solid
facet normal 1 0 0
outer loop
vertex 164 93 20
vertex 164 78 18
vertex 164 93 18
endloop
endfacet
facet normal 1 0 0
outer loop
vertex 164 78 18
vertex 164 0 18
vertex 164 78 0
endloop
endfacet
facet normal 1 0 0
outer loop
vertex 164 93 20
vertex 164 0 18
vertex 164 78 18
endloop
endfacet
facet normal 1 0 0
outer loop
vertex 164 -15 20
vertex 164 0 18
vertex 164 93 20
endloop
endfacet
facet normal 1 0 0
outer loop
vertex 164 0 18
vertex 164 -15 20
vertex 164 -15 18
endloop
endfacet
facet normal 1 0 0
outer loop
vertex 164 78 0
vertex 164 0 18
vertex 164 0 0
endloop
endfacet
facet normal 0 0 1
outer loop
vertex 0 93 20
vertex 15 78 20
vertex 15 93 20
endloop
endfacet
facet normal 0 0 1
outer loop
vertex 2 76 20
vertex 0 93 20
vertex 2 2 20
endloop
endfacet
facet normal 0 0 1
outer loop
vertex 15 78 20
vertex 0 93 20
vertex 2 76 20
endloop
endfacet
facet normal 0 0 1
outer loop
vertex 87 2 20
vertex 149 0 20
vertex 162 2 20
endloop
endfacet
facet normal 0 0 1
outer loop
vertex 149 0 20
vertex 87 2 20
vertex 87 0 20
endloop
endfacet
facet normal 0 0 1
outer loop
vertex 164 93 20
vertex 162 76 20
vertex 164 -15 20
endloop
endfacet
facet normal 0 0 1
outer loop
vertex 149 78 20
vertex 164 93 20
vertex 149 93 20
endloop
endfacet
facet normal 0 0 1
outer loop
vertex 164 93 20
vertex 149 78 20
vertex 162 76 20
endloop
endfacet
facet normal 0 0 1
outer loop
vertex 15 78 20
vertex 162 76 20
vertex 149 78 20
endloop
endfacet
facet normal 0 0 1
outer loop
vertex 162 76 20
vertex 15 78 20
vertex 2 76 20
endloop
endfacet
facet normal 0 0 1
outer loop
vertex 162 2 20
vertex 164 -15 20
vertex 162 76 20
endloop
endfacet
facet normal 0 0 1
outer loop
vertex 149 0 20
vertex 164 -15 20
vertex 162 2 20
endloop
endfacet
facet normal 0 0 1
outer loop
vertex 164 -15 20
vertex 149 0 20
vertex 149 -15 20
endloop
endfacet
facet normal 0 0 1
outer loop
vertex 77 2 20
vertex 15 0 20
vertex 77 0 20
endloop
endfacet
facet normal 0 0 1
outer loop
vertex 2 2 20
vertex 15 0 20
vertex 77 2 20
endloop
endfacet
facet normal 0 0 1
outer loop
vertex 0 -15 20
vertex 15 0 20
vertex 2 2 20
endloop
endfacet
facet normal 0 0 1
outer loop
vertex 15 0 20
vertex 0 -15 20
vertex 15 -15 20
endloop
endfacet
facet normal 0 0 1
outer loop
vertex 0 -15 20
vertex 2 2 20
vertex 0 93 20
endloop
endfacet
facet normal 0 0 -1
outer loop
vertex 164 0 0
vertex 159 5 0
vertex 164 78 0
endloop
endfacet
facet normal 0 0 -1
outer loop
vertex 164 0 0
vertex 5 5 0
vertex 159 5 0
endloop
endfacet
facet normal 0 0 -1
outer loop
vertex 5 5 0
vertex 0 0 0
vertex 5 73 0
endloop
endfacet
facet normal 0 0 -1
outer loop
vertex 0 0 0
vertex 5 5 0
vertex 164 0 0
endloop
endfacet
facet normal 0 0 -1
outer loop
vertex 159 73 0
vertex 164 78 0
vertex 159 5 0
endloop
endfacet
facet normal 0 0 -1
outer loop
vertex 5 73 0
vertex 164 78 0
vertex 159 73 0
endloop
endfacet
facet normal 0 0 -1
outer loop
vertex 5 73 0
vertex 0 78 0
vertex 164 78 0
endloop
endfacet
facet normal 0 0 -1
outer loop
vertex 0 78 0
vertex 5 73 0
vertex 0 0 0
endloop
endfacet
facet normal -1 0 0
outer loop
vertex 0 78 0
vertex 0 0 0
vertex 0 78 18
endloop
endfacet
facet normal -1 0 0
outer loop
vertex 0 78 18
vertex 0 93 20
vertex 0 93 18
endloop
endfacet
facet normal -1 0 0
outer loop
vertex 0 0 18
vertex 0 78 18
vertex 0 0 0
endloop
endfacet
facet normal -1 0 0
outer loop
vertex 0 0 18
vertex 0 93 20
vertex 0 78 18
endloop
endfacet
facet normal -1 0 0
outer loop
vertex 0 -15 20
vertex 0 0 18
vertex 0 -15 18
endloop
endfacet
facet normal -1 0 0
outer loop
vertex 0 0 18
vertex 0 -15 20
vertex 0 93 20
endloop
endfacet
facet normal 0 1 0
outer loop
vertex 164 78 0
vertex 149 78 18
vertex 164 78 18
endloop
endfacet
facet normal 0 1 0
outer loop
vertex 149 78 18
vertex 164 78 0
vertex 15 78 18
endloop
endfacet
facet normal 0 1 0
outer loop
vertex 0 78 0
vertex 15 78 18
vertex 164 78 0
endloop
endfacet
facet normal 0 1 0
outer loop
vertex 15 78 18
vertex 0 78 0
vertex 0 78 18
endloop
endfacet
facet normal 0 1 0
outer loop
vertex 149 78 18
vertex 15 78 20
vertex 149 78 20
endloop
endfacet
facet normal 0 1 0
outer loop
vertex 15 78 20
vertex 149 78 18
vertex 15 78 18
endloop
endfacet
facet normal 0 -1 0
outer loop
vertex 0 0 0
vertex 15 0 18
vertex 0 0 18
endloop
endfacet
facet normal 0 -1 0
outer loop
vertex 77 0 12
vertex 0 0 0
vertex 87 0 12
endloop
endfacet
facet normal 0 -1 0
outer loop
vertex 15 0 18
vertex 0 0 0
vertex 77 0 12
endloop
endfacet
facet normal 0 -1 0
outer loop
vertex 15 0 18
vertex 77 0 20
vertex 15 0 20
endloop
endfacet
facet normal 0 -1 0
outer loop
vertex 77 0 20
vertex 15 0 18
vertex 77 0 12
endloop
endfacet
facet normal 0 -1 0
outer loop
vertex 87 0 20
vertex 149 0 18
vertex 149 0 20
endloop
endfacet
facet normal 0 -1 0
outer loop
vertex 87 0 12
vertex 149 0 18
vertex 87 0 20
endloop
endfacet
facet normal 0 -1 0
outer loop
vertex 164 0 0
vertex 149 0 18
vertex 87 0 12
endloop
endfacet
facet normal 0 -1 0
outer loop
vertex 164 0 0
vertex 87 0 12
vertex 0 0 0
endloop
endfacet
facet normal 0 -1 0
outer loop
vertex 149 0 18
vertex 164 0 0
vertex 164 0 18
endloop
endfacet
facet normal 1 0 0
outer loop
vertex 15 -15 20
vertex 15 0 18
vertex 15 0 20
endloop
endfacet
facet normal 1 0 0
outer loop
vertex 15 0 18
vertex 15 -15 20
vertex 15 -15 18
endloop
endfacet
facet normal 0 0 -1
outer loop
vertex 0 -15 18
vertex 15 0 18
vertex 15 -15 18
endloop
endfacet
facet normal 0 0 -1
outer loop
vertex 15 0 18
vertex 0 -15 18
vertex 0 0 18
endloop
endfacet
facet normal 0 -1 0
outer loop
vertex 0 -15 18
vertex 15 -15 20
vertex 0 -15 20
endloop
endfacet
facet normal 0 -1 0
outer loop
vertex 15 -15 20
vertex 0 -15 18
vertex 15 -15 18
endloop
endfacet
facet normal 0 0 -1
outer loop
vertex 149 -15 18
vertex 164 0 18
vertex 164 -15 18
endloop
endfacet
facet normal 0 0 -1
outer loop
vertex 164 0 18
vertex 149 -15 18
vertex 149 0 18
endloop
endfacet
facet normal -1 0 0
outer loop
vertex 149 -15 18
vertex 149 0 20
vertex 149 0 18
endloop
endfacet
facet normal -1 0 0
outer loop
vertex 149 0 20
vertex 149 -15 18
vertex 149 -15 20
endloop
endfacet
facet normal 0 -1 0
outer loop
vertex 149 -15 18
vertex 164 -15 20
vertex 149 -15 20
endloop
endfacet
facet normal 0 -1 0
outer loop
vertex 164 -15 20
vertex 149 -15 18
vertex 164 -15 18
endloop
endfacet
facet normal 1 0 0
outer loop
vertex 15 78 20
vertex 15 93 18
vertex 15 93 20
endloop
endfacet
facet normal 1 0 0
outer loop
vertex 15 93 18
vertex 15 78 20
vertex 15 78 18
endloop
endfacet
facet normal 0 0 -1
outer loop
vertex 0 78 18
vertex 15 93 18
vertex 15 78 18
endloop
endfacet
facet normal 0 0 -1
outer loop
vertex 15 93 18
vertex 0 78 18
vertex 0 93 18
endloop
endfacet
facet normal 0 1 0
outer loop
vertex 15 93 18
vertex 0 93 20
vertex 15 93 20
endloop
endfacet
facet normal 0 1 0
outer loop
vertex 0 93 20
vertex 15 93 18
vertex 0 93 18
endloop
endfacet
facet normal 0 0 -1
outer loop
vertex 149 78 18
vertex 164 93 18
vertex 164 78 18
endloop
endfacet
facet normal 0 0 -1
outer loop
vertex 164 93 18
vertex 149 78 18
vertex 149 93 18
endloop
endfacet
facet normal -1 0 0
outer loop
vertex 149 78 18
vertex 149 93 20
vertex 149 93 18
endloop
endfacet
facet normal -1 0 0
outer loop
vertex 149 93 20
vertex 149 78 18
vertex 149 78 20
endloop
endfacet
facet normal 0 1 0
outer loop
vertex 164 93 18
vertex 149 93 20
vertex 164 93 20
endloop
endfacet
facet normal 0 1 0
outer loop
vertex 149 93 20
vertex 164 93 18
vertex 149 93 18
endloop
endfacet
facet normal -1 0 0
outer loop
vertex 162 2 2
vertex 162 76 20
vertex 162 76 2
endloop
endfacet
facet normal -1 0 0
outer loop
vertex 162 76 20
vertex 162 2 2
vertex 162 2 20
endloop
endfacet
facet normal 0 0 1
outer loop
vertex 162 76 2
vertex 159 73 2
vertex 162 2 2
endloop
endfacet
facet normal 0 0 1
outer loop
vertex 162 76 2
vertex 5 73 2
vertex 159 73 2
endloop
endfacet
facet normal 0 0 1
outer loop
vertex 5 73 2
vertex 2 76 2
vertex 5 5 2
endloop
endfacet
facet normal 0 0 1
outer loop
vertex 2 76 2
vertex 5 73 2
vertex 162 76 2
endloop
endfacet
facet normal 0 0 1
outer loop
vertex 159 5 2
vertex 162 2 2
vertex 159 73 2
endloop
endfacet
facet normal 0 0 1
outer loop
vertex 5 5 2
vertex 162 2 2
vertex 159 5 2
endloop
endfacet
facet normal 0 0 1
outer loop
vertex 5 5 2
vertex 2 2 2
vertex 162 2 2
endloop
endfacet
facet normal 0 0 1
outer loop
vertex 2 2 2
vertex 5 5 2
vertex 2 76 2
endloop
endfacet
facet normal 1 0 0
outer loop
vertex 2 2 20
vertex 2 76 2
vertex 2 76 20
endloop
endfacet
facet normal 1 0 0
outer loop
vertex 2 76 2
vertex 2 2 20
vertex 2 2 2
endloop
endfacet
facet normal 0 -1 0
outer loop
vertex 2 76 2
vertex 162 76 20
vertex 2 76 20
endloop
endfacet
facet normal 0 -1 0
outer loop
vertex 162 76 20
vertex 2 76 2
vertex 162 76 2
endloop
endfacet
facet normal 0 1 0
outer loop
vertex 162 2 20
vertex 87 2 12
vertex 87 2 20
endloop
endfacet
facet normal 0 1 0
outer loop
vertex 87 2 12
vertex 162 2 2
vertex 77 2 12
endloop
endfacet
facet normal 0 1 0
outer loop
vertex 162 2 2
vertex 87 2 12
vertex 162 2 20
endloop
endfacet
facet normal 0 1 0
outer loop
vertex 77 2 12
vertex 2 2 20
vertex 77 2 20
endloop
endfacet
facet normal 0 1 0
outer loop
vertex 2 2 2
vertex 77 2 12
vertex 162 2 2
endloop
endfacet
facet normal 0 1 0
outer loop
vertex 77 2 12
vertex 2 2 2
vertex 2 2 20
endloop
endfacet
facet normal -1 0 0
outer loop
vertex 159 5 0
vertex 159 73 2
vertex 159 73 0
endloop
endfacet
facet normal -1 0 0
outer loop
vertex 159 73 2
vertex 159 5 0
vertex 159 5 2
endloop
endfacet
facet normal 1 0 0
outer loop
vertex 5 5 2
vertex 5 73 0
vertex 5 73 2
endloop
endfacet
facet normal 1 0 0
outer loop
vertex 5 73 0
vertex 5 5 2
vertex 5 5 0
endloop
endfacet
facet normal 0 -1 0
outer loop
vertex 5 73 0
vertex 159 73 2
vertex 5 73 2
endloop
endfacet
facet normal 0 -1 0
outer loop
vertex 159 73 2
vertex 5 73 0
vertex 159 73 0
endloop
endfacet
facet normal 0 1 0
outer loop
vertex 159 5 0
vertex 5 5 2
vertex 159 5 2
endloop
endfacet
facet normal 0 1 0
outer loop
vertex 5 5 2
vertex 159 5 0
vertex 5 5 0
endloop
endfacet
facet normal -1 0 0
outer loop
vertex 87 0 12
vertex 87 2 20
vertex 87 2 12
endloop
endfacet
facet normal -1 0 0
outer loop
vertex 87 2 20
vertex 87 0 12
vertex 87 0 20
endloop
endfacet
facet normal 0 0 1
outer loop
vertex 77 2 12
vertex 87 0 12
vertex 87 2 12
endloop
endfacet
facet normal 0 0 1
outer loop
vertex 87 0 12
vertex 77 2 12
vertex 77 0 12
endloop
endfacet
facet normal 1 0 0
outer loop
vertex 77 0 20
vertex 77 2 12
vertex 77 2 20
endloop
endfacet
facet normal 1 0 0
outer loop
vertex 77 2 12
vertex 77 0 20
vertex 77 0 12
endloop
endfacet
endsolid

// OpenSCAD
// Box enclosure for 160x74x18mm object

// Inner dimensions (the object to enclose)
inner_length = 160;
inner_width = 74;
inner_height = 18;

// Wall thickness
wall = 2;

// Bottom hole inset from inner walls
hole_inset = 3;

// Side hole dimensions
side_hole_width = 10;
side_hole_height = 8;

// Overhang dimensions
overhang_width = 15;
overhang_length = 15;

// Outer dimensions
outer_length = inner_length + 2 * wall;
outer_width = inner_width + 2 * wall;
outer_height = inner_height + wall; // wall on bottom only, open top

// Bottom hole dimensions
hole_length = inner_length - 2 * hole_inset;
hole_width = inner_width - 2 * hole_inset;

// Overhang positions along X (flush to edges)
overhang_x1 = 0;
overhang_x2 = outer_length - overhang_width;

difference() {
    union() {
        // Outer shell
        cube([outer_length, outer_width, outer_height]);

        // Left side overhangs (Y=0, extending in -Y)
        translate([overhang_x1, -overhang_length, outer_height - wall])
            cube([overhang_width, overhang_length, wall]);
        translate([overhang_x2, -overhang_length, outer_height - wall])
            cube([overhang_width, overhang_length, wall]);

        // Right side overhangs (Y=outer_width, extending in +Y)
        translate([overhang_x1, outer_width, outer_height - wall])
            cube([overhang_width, overhang_length, wall]);
        translate([overhang_x2, outer_width, outer_height - wall])
            cube([overhang_width, overhang_length, wall]);
    }

    // Inner cavity
    translate([wall, wall, wall])
        cube([inner_length, inner_width, inner_height + 1]);

    // Square hole in the bottom
    translate([wall + hole_inset, wall + hole_inset, -1])
        cube([hole_length, hole_width, wall + 2]);

    // Hole on the long side (front), centered horizontally, near top edge
    translate([outer_length / 2 - side_hole_width / 2, -1, outer_height - side_hole_height])
        cube([side_hole_width, wall + 2, side_hole_height + 1]);
}
